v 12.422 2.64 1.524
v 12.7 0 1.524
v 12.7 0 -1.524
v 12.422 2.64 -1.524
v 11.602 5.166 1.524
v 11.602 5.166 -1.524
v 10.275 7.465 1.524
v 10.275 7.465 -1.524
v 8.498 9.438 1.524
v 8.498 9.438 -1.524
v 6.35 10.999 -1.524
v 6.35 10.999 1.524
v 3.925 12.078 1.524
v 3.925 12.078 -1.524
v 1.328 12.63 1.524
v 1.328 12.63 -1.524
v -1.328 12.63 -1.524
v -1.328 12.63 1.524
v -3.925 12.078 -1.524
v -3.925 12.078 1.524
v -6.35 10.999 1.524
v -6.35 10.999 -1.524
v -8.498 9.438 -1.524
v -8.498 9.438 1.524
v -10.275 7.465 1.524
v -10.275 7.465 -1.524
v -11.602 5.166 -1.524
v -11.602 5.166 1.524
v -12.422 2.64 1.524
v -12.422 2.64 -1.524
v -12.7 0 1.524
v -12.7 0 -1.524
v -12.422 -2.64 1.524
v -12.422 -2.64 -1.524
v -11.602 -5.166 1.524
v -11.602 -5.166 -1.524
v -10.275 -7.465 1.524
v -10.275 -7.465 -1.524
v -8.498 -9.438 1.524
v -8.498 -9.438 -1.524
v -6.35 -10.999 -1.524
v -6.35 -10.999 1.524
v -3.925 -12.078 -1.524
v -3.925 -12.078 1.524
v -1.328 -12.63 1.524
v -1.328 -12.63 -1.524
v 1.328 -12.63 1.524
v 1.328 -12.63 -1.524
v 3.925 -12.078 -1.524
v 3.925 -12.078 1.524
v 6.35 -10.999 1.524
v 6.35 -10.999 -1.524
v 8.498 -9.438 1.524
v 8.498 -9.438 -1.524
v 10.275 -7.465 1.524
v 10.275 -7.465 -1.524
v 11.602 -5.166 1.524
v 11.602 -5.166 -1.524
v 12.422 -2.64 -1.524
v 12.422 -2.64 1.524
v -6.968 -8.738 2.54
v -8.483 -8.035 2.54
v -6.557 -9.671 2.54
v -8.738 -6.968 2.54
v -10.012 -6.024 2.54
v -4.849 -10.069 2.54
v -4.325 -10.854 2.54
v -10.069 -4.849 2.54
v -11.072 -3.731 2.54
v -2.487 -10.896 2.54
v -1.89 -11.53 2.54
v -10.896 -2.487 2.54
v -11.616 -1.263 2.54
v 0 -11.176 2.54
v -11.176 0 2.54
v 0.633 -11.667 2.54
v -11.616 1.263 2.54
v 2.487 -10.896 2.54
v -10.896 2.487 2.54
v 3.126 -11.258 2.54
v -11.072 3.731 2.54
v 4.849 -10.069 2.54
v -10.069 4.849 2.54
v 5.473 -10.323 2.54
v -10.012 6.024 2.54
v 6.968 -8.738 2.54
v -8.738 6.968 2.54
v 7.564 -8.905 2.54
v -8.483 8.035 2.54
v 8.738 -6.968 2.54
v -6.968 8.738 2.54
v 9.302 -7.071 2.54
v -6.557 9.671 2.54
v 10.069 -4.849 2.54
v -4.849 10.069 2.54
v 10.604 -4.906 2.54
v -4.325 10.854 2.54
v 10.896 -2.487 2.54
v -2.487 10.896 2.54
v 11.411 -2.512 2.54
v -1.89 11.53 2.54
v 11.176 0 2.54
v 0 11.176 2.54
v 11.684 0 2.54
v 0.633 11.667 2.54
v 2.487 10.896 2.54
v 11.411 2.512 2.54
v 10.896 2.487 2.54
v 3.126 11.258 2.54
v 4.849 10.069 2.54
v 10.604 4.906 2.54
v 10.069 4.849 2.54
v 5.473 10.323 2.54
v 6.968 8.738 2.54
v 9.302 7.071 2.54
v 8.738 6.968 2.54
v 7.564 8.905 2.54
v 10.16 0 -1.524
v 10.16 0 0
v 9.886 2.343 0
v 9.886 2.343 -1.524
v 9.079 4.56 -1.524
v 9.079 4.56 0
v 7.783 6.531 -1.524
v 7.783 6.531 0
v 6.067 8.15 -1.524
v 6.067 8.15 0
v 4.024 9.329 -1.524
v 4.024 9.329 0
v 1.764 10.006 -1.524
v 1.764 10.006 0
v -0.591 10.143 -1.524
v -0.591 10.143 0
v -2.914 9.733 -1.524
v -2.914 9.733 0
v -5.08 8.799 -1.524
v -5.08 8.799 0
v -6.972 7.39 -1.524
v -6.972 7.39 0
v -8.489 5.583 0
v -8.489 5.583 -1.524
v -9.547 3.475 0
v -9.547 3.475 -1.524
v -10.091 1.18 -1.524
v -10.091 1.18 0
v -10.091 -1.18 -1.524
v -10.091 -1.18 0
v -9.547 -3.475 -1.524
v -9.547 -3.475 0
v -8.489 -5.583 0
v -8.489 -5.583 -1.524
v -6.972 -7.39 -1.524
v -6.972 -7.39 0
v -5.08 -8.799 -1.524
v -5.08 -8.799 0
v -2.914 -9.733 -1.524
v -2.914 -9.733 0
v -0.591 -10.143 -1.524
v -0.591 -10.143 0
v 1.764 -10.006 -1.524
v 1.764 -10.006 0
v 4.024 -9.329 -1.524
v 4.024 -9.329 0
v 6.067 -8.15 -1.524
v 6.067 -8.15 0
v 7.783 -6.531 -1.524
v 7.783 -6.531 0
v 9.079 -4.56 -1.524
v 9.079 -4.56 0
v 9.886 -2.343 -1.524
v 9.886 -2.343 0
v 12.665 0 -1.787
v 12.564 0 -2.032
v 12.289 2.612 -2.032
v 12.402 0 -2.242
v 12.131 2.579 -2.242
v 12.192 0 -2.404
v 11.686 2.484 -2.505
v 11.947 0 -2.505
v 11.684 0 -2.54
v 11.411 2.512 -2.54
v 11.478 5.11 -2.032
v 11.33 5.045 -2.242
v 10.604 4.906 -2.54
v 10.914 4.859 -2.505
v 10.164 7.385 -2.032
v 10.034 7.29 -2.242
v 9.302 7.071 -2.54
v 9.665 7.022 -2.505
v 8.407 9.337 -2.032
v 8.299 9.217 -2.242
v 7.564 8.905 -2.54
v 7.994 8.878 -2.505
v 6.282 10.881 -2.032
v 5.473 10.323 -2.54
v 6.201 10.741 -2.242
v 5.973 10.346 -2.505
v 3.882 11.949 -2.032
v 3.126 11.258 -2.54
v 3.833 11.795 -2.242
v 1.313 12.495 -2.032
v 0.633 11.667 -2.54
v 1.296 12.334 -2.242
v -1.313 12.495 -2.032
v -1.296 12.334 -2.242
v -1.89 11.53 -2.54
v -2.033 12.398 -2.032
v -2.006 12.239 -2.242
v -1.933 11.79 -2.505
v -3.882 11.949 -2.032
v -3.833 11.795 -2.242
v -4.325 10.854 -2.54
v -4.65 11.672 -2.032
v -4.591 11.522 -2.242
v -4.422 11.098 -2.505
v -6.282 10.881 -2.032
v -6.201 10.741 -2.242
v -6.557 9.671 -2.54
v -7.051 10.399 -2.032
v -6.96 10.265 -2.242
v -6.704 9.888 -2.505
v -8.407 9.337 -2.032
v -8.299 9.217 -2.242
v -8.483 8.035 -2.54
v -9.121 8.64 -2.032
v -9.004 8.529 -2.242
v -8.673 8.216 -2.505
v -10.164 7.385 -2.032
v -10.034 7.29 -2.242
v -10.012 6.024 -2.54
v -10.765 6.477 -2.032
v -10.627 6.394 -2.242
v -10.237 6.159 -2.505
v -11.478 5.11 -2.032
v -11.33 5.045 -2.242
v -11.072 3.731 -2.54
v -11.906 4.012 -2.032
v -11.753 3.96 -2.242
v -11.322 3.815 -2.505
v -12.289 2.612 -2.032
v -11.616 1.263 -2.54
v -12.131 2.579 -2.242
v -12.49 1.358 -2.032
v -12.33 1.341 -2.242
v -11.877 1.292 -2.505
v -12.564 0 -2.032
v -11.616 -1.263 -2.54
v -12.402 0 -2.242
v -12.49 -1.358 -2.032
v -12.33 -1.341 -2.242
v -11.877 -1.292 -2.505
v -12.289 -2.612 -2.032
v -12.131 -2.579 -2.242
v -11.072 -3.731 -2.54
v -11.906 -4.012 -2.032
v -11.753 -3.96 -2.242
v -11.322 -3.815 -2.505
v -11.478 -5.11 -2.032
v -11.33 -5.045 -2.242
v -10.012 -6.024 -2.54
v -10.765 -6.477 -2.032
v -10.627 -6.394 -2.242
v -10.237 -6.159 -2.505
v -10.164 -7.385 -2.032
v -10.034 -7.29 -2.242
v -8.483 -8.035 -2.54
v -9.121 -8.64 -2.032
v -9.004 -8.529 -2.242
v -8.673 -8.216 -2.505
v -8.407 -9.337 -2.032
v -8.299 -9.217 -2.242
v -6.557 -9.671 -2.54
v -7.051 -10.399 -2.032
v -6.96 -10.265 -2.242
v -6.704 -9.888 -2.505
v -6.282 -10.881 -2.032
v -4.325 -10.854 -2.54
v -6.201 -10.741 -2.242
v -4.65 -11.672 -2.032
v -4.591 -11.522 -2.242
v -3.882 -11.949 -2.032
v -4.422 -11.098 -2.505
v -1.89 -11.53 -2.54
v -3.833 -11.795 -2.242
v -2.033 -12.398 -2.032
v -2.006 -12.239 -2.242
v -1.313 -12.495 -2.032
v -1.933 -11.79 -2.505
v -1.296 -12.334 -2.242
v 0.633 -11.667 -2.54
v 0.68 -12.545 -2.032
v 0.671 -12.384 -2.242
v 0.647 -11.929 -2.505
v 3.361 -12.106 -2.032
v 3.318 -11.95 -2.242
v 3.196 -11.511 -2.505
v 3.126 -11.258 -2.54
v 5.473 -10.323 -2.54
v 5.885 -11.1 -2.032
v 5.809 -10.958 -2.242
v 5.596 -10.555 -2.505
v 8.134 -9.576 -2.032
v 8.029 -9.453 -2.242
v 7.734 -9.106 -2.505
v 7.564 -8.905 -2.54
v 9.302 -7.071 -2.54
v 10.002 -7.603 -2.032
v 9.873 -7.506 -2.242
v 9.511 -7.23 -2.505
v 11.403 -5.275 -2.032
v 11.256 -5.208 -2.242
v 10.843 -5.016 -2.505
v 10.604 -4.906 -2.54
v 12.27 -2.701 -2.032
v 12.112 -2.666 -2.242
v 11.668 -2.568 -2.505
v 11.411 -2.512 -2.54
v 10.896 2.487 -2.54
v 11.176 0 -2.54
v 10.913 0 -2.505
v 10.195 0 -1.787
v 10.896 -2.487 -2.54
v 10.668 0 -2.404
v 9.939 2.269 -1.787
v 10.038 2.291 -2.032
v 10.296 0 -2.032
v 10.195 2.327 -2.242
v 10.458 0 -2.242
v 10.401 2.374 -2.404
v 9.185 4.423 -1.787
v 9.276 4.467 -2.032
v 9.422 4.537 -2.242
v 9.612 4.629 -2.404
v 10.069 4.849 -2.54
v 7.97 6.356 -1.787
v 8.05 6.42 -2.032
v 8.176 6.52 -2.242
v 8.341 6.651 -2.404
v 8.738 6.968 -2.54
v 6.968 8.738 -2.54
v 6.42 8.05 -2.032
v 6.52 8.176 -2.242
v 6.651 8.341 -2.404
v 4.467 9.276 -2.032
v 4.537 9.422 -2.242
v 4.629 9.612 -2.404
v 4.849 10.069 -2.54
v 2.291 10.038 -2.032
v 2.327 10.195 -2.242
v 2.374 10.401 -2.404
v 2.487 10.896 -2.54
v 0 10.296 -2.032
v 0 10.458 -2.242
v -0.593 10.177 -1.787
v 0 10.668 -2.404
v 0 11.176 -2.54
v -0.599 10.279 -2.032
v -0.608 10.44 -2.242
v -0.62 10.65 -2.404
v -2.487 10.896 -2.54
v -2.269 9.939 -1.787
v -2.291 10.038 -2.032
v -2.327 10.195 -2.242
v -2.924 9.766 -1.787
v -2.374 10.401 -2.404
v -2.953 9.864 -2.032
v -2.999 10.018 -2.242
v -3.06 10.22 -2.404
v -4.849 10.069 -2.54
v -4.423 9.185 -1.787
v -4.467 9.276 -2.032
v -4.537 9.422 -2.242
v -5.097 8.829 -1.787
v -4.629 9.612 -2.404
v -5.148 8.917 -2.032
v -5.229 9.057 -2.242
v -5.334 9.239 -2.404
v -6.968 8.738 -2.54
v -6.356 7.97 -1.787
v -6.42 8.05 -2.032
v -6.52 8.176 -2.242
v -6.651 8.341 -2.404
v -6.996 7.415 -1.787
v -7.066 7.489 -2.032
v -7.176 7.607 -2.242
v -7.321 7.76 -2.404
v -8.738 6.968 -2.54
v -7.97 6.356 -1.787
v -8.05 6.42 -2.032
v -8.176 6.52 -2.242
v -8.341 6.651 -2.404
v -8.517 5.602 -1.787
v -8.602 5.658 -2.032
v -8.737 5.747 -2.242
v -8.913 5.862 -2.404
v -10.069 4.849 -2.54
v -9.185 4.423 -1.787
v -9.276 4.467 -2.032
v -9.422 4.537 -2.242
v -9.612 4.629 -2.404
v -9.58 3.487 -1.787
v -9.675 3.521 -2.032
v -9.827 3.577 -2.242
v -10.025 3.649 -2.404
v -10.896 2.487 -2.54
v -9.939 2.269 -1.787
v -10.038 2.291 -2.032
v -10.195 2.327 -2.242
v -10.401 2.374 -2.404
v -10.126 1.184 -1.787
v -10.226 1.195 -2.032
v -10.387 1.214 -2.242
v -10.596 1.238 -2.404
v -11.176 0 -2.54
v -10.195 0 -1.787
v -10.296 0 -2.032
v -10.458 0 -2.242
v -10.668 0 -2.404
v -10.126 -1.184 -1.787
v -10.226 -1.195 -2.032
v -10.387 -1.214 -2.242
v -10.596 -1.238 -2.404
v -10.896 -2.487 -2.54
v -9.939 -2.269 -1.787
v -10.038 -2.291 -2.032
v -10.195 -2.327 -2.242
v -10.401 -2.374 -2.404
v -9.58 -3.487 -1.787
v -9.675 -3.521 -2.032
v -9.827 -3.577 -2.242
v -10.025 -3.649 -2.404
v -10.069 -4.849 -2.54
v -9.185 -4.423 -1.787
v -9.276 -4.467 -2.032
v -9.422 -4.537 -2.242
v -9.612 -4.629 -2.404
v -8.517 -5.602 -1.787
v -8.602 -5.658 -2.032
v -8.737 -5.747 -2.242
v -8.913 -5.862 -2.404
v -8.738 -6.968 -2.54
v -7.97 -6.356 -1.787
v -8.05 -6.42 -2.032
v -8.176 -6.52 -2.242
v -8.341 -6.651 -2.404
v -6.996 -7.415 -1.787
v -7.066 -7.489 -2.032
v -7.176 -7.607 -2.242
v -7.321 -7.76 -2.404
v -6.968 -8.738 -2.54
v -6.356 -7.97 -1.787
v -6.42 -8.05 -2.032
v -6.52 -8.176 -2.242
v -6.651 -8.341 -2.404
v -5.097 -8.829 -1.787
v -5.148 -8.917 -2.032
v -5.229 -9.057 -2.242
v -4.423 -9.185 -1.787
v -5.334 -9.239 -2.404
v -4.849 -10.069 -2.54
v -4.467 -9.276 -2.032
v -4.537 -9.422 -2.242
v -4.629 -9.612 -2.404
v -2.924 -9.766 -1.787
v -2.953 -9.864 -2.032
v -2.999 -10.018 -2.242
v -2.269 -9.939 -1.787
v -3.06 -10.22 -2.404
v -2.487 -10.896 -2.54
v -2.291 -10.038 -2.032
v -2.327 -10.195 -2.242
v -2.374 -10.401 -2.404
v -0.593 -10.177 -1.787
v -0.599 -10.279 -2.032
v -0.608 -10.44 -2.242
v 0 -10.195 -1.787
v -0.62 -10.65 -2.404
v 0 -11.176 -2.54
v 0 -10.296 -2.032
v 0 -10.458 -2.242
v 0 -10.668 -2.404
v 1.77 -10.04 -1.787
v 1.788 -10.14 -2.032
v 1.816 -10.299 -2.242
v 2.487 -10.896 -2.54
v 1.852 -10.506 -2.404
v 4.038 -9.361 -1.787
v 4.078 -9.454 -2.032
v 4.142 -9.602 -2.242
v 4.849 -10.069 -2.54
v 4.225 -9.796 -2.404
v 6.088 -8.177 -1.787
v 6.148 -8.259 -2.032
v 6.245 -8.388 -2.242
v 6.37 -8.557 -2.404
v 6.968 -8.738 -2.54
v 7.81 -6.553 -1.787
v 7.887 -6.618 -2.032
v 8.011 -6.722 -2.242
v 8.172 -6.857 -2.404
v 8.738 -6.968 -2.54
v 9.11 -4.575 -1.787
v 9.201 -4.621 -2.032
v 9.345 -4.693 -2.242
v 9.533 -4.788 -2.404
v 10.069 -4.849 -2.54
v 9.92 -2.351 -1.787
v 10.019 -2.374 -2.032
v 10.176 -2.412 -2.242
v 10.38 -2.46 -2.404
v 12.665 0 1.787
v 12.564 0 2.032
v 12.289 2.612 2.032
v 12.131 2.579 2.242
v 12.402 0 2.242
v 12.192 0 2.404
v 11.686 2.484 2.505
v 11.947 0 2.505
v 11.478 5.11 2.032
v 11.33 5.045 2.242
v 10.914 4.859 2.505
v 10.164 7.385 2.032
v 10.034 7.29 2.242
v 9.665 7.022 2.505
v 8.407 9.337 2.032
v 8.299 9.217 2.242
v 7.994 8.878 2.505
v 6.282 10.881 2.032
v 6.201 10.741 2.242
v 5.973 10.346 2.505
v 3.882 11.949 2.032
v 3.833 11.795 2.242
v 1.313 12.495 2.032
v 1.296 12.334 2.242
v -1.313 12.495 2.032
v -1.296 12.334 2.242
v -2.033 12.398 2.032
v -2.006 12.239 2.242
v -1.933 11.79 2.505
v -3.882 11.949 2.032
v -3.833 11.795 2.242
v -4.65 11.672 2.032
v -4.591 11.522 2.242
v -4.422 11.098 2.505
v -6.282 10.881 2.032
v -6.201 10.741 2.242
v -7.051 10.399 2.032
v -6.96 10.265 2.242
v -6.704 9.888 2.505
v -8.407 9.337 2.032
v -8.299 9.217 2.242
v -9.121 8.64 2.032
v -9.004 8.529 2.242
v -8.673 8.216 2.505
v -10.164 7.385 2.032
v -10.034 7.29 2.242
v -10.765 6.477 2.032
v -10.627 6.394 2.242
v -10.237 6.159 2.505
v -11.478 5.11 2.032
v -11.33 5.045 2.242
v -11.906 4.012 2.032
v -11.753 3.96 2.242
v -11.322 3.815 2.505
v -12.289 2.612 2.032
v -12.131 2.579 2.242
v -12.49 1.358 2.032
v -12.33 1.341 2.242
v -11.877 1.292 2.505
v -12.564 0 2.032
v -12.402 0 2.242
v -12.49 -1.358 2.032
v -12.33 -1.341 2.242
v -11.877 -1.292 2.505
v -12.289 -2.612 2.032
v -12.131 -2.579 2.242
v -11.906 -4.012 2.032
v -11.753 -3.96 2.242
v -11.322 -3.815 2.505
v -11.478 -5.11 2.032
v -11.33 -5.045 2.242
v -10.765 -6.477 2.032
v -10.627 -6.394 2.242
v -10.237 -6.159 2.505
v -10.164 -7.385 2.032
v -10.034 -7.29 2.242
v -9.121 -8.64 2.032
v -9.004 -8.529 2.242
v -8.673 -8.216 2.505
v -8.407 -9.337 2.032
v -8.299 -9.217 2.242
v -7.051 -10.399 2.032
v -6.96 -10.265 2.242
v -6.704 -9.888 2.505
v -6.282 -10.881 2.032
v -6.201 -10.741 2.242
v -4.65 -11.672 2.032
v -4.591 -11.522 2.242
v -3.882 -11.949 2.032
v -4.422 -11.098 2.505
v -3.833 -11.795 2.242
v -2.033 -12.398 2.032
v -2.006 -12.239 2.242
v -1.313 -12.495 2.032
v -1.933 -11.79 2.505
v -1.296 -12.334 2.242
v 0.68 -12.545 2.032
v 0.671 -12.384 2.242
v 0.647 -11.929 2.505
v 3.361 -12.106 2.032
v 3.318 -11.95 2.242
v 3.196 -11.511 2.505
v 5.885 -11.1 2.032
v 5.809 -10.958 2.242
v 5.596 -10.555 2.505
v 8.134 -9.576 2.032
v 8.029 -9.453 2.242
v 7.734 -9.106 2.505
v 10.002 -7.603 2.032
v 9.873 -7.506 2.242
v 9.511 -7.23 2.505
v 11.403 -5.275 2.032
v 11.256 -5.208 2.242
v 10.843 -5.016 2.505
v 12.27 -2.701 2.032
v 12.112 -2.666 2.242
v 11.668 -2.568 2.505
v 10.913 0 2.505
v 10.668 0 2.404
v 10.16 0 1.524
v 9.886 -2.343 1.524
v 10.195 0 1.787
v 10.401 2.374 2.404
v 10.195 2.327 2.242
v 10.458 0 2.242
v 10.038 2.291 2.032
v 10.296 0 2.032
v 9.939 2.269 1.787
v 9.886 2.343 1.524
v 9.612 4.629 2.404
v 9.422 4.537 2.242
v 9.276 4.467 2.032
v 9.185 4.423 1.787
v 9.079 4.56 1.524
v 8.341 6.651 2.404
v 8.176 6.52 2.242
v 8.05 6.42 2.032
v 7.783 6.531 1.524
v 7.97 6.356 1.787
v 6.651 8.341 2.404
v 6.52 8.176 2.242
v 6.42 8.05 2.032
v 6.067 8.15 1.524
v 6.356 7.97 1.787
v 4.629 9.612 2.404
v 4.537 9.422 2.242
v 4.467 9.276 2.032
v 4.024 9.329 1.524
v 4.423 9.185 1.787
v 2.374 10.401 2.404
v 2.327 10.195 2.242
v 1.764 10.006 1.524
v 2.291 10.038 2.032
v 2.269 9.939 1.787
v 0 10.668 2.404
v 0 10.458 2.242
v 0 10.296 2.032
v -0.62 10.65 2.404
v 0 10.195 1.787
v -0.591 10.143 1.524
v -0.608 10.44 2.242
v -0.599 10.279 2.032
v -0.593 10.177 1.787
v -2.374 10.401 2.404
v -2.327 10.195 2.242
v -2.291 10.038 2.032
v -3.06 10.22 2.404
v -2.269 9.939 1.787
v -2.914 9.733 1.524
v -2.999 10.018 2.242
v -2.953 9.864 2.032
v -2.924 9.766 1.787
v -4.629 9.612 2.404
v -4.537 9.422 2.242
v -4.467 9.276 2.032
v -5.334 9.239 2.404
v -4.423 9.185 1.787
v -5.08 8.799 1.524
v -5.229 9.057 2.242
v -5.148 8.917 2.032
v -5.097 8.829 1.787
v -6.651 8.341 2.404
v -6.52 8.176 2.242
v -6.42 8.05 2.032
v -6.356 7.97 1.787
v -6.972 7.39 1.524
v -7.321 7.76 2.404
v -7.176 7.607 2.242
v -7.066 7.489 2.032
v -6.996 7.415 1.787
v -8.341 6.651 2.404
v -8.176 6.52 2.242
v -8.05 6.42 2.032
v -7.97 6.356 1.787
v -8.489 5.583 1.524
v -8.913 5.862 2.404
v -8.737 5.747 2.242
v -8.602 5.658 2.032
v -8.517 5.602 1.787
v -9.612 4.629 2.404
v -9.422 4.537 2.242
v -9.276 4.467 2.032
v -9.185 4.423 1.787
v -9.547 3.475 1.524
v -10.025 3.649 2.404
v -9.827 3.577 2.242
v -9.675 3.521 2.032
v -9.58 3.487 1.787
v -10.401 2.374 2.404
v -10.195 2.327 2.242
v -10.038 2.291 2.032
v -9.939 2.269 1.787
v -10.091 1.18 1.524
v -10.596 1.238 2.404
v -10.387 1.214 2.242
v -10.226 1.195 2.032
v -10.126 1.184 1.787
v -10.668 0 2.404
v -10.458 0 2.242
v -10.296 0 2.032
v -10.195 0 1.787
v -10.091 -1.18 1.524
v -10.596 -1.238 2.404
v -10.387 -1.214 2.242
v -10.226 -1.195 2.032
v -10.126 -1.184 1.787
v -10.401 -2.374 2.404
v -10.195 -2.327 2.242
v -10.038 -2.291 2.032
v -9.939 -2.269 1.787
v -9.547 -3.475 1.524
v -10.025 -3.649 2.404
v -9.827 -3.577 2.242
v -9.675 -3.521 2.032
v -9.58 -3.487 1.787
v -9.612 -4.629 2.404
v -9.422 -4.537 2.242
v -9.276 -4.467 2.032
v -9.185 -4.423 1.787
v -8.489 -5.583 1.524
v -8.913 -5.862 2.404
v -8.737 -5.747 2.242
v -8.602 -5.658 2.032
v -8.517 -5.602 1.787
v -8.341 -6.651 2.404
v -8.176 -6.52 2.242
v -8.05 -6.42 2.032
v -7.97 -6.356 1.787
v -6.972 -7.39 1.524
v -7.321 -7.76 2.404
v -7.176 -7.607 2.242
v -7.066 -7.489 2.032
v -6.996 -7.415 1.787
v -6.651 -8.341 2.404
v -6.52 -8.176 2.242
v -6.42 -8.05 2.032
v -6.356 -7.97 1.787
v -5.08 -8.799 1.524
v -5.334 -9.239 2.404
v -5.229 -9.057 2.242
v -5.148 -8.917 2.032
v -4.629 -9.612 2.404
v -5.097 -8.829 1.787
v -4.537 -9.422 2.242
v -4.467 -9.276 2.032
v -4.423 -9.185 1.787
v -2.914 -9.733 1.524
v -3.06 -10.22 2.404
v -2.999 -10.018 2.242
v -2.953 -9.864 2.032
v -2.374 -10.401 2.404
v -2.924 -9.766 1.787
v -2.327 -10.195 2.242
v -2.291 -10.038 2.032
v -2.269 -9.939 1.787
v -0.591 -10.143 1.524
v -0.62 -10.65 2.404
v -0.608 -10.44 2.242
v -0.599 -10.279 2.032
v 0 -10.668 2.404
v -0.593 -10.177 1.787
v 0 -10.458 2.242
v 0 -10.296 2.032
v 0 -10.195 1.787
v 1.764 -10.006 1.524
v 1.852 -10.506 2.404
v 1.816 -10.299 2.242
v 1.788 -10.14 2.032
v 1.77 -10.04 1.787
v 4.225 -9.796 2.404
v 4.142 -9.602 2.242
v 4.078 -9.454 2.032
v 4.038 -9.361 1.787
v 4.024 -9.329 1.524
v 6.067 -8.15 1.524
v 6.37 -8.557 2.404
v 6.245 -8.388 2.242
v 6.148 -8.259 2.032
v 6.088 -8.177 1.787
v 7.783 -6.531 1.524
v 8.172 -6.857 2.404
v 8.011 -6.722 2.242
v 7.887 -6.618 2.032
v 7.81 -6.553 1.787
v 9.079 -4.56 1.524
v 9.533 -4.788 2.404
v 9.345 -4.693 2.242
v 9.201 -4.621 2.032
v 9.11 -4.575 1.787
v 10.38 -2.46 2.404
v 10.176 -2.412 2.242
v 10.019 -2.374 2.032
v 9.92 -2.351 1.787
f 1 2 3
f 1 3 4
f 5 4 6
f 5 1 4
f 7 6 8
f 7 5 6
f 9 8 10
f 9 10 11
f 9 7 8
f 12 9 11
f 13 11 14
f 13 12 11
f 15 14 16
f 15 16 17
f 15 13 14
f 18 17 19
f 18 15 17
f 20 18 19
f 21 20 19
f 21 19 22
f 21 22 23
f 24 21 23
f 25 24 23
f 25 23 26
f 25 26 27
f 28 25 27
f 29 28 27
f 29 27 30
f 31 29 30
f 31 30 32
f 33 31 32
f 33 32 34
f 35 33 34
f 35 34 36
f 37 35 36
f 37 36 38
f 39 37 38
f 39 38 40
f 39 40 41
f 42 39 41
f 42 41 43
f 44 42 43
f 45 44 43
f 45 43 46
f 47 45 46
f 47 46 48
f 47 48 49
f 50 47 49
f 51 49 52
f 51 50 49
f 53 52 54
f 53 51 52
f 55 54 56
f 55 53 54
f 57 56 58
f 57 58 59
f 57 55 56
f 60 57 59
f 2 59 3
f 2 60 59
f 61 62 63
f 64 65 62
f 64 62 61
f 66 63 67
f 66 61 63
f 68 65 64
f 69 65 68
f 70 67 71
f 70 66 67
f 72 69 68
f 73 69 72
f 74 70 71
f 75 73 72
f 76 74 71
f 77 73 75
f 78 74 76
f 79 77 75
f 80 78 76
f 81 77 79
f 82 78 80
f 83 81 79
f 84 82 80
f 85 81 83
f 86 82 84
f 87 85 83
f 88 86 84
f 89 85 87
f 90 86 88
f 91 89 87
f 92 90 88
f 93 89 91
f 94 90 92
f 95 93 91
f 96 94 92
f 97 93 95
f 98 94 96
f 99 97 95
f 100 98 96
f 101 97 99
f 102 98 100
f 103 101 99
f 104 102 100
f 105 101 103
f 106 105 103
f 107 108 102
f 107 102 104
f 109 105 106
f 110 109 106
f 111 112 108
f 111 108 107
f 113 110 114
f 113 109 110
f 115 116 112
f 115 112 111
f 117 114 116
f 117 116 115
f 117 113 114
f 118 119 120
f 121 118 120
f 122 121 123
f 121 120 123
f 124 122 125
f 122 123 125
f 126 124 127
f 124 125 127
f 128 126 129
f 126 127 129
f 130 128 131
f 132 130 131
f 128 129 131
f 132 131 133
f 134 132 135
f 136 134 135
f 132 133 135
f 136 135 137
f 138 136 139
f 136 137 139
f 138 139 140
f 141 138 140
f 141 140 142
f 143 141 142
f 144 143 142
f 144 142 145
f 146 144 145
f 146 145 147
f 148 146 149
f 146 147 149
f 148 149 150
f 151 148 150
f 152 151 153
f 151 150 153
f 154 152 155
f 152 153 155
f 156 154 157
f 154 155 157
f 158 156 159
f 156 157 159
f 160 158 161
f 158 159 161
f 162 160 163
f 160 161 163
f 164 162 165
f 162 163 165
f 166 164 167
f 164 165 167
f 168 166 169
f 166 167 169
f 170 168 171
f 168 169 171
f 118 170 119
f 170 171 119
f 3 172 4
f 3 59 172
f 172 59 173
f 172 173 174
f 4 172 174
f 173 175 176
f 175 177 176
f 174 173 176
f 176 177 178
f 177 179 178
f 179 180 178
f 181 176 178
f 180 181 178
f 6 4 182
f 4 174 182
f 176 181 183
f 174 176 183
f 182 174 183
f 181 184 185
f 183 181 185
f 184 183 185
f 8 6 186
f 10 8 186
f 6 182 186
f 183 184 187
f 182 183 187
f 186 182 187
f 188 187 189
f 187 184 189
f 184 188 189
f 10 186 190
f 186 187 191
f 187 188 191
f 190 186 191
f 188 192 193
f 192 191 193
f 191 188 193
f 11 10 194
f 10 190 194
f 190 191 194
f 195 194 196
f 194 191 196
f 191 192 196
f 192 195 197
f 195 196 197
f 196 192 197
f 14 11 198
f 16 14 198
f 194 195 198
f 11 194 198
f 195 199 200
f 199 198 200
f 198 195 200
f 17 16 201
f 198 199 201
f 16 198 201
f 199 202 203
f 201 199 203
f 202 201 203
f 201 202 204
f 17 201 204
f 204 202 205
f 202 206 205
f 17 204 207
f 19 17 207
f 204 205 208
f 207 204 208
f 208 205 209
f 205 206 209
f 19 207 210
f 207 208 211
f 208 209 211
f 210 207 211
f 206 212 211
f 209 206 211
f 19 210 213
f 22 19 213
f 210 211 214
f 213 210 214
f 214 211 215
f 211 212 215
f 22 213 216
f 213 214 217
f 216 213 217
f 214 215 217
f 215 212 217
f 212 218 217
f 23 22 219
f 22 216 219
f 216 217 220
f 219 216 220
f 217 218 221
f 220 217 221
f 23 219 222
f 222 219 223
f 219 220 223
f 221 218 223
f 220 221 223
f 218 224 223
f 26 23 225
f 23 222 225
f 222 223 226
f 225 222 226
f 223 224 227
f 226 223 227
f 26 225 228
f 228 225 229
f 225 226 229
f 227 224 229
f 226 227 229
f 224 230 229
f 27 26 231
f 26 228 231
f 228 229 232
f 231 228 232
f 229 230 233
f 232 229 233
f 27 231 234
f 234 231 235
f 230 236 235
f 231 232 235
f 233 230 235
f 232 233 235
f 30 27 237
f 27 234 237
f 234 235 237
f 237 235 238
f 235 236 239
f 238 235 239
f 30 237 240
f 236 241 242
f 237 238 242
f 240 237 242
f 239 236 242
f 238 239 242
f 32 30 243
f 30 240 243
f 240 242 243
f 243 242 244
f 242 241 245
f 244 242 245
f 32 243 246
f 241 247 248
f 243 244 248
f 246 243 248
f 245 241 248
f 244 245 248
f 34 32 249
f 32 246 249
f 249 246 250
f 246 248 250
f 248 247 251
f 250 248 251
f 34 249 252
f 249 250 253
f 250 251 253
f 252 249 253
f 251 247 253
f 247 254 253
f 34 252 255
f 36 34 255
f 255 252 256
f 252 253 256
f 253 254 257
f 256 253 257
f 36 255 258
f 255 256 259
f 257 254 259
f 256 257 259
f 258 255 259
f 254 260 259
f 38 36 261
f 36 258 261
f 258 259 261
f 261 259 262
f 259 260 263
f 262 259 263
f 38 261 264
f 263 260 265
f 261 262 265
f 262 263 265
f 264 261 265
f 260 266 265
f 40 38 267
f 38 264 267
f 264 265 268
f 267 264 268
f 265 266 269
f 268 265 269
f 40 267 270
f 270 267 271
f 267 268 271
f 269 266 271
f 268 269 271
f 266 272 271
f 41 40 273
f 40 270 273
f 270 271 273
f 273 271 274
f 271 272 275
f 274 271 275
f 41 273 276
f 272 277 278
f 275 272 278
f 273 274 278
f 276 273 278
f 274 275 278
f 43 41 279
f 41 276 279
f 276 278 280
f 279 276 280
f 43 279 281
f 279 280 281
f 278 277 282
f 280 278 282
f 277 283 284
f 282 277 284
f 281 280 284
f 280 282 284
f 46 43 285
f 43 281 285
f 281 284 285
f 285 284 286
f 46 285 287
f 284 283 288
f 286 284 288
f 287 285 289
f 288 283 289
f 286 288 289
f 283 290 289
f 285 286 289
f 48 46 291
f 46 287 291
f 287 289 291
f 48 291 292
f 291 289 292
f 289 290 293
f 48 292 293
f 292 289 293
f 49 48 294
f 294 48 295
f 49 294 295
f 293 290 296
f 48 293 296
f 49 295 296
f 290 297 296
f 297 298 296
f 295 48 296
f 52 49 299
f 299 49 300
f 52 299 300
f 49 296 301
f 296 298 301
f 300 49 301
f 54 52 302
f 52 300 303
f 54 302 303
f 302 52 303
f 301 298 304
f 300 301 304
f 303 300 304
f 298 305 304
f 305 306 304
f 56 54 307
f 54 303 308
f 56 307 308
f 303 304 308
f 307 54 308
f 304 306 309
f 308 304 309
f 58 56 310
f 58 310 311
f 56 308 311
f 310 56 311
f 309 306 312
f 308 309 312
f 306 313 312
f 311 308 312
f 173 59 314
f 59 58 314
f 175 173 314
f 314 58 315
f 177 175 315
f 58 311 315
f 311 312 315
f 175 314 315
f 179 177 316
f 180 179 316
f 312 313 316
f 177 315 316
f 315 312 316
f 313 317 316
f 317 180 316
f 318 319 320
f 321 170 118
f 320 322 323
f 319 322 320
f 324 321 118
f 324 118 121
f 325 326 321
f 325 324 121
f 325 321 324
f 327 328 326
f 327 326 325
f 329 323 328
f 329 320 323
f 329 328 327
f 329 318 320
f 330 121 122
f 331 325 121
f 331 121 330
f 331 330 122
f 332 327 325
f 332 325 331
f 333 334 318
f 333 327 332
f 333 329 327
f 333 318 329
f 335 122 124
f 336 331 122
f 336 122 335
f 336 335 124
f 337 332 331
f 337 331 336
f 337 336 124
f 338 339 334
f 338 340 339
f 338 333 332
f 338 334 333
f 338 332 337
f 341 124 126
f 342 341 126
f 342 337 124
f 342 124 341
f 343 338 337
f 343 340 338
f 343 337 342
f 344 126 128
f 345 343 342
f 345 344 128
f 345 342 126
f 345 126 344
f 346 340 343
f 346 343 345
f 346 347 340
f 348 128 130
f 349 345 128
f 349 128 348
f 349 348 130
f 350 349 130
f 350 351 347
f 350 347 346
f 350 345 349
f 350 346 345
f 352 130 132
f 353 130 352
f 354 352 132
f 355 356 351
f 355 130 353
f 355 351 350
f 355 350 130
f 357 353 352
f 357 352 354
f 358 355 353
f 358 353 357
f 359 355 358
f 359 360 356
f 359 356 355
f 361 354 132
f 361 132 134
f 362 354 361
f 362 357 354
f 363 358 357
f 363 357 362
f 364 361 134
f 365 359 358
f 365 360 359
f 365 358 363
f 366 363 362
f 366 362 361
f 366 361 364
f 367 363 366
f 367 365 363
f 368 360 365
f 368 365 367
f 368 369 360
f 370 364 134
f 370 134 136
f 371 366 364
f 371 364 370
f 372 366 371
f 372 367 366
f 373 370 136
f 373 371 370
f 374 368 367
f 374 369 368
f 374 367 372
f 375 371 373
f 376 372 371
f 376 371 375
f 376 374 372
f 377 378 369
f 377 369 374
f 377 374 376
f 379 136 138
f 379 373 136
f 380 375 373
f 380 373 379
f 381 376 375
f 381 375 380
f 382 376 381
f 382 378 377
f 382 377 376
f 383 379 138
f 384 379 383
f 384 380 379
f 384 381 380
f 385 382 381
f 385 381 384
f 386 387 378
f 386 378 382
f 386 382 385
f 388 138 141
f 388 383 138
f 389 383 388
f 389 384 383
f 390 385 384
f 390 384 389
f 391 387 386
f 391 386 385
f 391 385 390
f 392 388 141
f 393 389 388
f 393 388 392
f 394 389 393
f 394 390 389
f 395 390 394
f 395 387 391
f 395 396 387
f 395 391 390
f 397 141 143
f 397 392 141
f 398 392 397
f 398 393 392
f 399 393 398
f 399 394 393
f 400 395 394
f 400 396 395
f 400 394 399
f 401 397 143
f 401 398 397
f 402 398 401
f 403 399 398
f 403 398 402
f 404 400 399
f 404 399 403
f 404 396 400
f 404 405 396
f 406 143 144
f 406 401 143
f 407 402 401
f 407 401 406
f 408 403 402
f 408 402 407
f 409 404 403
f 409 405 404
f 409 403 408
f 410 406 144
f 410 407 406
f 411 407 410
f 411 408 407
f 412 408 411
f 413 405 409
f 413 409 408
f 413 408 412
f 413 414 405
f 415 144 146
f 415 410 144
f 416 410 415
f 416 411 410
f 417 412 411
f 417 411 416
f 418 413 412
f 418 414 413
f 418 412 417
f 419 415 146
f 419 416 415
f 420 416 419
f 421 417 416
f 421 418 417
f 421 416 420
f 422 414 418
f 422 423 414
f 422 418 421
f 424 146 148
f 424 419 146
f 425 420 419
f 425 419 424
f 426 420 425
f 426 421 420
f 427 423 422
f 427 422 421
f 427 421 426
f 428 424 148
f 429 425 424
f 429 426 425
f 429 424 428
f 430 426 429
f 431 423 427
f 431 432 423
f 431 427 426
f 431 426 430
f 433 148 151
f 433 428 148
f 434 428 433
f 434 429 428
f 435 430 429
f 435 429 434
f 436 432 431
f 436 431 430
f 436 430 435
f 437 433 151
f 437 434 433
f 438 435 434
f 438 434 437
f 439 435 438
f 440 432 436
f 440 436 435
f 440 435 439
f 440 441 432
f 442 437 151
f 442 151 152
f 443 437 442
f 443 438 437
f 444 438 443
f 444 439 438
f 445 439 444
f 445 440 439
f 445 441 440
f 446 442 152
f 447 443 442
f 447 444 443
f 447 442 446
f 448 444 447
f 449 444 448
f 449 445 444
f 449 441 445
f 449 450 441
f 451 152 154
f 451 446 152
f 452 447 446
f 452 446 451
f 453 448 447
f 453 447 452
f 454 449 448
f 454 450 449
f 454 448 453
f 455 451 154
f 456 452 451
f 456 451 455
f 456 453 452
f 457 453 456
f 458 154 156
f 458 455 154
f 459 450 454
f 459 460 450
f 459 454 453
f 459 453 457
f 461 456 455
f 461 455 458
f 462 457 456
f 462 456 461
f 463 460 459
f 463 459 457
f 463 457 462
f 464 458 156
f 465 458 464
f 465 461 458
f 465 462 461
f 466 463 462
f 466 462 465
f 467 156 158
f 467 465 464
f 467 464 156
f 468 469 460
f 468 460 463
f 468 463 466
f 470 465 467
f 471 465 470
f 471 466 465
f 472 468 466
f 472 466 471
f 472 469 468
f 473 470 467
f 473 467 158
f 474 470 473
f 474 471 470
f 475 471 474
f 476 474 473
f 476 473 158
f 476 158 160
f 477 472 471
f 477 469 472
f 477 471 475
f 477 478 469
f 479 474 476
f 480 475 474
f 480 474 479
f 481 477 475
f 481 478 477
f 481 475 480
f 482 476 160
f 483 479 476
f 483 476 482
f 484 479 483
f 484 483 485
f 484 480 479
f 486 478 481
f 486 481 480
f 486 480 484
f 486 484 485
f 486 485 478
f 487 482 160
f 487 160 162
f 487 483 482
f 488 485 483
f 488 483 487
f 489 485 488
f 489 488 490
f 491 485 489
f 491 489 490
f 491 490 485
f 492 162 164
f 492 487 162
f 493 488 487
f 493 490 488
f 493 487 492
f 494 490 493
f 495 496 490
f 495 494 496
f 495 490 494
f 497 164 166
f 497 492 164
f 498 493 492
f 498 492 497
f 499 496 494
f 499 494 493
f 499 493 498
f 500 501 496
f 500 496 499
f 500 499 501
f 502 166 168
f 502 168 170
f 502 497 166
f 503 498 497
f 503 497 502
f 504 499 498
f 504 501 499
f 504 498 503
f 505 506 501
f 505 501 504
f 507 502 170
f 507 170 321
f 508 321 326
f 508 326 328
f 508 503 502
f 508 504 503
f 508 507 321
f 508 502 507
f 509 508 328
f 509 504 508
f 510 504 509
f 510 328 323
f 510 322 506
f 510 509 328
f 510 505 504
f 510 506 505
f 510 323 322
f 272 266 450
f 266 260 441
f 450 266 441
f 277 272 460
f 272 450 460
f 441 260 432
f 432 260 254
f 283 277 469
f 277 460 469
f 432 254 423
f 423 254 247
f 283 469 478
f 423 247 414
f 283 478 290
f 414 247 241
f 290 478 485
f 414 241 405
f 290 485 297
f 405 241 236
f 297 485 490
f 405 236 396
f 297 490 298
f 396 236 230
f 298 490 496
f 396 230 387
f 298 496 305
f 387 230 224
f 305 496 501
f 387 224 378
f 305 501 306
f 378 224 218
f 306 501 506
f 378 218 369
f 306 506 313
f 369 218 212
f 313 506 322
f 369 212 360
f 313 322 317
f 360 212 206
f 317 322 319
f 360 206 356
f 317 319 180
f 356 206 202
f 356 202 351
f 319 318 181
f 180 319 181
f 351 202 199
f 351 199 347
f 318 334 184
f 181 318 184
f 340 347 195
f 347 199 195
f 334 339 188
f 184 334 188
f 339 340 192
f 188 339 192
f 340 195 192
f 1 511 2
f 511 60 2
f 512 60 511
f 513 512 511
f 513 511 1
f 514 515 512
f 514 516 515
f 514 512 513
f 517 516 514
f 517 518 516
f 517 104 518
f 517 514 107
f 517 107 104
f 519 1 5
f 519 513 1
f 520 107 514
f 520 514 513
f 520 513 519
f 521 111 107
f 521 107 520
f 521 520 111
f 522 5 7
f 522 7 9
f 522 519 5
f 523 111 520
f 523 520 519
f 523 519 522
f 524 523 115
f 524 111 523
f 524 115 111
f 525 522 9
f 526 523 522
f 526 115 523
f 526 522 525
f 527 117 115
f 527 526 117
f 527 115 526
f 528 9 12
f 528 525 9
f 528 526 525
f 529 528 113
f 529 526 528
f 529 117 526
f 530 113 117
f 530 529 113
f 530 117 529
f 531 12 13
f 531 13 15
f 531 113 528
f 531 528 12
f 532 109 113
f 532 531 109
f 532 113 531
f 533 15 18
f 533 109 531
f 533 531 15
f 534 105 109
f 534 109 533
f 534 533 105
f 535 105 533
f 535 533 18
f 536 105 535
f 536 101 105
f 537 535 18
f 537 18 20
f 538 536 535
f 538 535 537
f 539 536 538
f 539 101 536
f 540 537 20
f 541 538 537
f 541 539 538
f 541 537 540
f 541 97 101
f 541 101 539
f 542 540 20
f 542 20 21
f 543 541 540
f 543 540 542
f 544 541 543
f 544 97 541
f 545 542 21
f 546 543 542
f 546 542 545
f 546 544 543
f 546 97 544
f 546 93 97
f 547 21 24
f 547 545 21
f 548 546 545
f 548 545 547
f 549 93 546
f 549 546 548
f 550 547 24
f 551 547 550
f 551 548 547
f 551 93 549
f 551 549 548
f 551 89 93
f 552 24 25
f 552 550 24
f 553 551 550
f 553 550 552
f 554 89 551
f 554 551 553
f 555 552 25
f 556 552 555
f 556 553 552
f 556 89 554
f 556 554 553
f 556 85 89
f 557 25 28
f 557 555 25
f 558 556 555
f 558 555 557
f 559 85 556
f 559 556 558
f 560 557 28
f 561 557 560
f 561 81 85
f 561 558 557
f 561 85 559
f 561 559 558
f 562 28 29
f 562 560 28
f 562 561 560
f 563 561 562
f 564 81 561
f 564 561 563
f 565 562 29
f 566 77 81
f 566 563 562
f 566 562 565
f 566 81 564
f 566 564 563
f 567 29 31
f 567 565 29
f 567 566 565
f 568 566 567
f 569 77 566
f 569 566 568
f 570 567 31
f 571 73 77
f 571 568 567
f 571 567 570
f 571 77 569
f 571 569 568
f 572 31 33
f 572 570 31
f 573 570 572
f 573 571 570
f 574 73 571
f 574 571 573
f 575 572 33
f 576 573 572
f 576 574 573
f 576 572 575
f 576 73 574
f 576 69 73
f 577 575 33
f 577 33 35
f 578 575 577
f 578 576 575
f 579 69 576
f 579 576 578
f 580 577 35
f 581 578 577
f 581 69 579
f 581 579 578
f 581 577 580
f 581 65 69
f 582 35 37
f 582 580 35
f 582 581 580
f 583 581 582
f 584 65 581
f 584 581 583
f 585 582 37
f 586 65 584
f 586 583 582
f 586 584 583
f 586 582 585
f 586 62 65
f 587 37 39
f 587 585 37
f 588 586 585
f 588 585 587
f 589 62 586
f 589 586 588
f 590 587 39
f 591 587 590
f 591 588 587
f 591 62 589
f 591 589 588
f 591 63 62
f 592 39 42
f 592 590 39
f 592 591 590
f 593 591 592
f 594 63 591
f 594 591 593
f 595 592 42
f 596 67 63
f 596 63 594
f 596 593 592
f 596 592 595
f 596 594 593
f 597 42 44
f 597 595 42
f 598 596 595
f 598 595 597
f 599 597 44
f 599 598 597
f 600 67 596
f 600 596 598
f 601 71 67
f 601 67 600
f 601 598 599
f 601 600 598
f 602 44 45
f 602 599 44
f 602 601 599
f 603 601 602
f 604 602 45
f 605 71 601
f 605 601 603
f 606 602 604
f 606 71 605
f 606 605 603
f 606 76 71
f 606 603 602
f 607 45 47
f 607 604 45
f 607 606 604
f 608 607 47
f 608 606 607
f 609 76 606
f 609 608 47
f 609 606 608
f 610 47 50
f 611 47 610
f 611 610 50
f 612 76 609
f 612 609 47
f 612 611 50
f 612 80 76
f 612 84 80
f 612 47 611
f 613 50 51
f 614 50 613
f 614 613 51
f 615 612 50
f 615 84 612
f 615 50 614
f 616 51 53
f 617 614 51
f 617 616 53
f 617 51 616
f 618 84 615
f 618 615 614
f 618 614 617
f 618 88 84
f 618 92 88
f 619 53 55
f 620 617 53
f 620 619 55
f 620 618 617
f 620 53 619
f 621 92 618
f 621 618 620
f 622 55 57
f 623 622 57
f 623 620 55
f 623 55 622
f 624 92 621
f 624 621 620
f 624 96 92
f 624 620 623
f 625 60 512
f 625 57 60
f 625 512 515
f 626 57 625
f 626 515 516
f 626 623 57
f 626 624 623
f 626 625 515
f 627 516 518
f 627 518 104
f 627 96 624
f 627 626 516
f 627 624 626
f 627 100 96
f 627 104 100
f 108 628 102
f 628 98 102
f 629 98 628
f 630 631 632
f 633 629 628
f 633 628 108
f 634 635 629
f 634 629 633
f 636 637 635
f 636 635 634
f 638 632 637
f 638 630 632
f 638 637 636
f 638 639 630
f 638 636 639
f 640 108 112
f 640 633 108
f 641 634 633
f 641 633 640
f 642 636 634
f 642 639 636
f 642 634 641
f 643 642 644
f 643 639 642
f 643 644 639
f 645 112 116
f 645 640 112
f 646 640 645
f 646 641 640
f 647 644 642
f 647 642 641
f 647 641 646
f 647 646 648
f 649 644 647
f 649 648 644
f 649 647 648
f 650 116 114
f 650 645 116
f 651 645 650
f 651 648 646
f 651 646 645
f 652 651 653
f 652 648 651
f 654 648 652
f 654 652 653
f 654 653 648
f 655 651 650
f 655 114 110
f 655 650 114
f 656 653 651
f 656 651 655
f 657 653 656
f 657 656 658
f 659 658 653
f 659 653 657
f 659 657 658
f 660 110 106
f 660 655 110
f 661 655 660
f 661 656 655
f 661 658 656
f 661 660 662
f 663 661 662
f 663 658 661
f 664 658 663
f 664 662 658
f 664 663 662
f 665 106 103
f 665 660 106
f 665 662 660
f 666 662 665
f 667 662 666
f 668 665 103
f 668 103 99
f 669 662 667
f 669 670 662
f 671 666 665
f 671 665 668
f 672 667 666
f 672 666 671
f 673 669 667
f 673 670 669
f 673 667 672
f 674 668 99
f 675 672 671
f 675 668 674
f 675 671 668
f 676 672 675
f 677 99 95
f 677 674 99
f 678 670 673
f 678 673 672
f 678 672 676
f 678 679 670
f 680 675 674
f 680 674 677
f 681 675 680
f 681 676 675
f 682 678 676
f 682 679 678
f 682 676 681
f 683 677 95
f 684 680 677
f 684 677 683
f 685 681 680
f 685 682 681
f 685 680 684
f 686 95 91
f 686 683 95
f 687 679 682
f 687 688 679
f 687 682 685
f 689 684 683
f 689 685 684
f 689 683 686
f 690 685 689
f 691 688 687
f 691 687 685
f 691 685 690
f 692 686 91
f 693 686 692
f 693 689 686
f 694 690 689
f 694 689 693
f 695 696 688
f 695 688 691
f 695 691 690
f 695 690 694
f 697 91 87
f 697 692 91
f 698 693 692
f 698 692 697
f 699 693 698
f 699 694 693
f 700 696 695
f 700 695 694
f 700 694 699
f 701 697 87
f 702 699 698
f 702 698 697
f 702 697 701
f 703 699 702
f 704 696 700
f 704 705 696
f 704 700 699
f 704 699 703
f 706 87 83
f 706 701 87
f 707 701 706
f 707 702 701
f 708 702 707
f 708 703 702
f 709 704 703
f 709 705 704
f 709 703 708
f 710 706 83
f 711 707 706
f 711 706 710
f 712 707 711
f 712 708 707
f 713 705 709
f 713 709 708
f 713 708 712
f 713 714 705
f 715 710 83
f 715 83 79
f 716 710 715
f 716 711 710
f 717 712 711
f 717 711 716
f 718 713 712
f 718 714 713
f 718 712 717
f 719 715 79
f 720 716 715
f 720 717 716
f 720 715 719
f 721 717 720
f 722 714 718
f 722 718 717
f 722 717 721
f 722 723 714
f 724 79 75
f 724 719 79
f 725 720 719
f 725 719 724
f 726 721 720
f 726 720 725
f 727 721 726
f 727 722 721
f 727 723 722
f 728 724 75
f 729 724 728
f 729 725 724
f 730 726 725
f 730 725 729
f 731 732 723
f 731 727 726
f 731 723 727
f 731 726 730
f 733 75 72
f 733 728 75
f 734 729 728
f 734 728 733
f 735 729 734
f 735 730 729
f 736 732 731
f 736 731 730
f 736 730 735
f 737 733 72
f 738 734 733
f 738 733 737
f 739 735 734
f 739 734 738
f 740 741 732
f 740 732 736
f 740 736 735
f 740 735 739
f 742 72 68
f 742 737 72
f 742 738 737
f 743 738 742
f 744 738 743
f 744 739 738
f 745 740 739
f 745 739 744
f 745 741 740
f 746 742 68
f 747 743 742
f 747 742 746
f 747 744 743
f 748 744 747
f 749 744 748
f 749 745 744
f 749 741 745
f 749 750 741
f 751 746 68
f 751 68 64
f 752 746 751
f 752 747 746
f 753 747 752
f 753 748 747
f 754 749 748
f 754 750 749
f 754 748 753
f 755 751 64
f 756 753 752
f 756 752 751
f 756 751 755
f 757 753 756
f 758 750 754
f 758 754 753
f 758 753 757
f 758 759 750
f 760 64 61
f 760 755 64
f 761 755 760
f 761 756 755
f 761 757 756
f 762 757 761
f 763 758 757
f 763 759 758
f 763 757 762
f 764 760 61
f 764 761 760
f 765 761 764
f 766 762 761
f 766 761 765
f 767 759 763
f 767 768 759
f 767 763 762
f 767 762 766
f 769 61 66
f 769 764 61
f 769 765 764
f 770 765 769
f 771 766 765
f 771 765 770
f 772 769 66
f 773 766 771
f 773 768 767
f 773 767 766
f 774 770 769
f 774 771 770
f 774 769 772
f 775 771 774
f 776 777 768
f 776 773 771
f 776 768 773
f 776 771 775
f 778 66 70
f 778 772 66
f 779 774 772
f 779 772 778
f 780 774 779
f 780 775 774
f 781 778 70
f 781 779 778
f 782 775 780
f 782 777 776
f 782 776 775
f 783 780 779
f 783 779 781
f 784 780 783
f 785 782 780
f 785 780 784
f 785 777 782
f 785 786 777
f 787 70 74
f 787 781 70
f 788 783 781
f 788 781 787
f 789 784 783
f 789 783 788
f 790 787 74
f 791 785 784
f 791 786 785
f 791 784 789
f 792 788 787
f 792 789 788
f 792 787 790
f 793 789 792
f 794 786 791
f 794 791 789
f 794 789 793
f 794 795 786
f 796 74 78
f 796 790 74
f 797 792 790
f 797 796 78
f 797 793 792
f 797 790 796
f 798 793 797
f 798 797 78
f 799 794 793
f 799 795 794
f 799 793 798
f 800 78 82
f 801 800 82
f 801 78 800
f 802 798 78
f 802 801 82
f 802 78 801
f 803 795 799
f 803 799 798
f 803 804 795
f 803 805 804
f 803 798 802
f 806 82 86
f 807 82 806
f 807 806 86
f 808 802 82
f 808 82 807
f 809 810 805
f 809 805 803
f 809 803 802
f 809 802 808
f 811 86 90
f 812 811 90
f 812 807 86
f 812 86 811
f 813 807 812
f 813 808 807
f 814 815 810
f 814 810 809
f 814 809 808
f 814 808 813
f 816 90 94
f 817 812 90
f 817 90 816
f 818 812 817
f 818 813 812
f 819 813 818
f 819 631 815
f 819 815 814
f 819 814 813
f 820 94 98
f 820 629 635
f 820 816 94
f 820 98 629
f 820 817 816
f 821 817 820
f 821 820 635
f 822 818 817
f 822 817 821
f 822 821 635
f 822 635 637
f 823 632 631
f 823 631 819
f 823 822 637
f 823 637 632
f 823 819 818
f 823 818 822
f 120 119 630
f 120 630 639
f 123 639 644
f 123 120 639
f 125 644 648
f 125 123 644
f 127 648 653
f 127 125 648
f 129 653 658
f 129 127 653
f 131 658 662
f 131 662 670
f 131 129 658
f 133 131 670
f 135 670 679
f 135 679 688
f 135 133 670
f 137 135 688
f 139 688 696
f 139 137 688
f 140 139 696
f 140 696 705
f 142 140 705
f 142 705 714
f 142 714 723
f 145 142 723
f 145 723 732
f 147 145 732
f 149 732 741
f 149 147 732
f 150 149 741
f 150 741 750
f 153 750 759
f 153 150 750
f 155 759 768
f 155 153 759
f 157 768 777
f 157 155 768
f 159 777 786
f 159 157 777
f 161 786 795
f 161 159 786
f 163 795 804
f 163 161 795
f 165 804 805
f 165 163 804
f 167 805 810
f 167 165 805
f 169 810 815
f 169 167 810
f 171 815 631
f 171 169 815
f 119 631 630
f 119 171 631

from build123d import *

# Parameters (mm, degrees)
F0_R          = 12.7
F0_R_2        = 10.16
F1_DEPTH      = 2.54
F1_DEPTH_BACK = 2.54
F2_R          = 1.016


with BuildPart() as f1:
    # F0 (on Top) → F1 (new body, two sides)
    with BuildSketch(Plane.XY) as f1_sk:
        Circle(F0_R)
        Circle(F0_R_2, mode=Mode.SUBTRACT)
    extrude(amount=F1_DEPTH)
    extrude(f1_sk.sketch, amount=-F1_DEPTH_BACK)

    # F2
    f2_edges = [f1.edges().sort_by_distance(p)[0] for p in [
        (12.7, 0, -1.27),
        (-12.7, 0, 0),
        (-12.7, 0, -2.54),
        (10.16, 0, -1.27),
        (-10.16, 0, 0),
        (-10.16, 0, -2.54),
        (-12.7, 0, 2.54),
        (-10.16, 0, 2.54),
    ]]
    fillet(f2_edges, radius=F2_R)


solid = f1.part
